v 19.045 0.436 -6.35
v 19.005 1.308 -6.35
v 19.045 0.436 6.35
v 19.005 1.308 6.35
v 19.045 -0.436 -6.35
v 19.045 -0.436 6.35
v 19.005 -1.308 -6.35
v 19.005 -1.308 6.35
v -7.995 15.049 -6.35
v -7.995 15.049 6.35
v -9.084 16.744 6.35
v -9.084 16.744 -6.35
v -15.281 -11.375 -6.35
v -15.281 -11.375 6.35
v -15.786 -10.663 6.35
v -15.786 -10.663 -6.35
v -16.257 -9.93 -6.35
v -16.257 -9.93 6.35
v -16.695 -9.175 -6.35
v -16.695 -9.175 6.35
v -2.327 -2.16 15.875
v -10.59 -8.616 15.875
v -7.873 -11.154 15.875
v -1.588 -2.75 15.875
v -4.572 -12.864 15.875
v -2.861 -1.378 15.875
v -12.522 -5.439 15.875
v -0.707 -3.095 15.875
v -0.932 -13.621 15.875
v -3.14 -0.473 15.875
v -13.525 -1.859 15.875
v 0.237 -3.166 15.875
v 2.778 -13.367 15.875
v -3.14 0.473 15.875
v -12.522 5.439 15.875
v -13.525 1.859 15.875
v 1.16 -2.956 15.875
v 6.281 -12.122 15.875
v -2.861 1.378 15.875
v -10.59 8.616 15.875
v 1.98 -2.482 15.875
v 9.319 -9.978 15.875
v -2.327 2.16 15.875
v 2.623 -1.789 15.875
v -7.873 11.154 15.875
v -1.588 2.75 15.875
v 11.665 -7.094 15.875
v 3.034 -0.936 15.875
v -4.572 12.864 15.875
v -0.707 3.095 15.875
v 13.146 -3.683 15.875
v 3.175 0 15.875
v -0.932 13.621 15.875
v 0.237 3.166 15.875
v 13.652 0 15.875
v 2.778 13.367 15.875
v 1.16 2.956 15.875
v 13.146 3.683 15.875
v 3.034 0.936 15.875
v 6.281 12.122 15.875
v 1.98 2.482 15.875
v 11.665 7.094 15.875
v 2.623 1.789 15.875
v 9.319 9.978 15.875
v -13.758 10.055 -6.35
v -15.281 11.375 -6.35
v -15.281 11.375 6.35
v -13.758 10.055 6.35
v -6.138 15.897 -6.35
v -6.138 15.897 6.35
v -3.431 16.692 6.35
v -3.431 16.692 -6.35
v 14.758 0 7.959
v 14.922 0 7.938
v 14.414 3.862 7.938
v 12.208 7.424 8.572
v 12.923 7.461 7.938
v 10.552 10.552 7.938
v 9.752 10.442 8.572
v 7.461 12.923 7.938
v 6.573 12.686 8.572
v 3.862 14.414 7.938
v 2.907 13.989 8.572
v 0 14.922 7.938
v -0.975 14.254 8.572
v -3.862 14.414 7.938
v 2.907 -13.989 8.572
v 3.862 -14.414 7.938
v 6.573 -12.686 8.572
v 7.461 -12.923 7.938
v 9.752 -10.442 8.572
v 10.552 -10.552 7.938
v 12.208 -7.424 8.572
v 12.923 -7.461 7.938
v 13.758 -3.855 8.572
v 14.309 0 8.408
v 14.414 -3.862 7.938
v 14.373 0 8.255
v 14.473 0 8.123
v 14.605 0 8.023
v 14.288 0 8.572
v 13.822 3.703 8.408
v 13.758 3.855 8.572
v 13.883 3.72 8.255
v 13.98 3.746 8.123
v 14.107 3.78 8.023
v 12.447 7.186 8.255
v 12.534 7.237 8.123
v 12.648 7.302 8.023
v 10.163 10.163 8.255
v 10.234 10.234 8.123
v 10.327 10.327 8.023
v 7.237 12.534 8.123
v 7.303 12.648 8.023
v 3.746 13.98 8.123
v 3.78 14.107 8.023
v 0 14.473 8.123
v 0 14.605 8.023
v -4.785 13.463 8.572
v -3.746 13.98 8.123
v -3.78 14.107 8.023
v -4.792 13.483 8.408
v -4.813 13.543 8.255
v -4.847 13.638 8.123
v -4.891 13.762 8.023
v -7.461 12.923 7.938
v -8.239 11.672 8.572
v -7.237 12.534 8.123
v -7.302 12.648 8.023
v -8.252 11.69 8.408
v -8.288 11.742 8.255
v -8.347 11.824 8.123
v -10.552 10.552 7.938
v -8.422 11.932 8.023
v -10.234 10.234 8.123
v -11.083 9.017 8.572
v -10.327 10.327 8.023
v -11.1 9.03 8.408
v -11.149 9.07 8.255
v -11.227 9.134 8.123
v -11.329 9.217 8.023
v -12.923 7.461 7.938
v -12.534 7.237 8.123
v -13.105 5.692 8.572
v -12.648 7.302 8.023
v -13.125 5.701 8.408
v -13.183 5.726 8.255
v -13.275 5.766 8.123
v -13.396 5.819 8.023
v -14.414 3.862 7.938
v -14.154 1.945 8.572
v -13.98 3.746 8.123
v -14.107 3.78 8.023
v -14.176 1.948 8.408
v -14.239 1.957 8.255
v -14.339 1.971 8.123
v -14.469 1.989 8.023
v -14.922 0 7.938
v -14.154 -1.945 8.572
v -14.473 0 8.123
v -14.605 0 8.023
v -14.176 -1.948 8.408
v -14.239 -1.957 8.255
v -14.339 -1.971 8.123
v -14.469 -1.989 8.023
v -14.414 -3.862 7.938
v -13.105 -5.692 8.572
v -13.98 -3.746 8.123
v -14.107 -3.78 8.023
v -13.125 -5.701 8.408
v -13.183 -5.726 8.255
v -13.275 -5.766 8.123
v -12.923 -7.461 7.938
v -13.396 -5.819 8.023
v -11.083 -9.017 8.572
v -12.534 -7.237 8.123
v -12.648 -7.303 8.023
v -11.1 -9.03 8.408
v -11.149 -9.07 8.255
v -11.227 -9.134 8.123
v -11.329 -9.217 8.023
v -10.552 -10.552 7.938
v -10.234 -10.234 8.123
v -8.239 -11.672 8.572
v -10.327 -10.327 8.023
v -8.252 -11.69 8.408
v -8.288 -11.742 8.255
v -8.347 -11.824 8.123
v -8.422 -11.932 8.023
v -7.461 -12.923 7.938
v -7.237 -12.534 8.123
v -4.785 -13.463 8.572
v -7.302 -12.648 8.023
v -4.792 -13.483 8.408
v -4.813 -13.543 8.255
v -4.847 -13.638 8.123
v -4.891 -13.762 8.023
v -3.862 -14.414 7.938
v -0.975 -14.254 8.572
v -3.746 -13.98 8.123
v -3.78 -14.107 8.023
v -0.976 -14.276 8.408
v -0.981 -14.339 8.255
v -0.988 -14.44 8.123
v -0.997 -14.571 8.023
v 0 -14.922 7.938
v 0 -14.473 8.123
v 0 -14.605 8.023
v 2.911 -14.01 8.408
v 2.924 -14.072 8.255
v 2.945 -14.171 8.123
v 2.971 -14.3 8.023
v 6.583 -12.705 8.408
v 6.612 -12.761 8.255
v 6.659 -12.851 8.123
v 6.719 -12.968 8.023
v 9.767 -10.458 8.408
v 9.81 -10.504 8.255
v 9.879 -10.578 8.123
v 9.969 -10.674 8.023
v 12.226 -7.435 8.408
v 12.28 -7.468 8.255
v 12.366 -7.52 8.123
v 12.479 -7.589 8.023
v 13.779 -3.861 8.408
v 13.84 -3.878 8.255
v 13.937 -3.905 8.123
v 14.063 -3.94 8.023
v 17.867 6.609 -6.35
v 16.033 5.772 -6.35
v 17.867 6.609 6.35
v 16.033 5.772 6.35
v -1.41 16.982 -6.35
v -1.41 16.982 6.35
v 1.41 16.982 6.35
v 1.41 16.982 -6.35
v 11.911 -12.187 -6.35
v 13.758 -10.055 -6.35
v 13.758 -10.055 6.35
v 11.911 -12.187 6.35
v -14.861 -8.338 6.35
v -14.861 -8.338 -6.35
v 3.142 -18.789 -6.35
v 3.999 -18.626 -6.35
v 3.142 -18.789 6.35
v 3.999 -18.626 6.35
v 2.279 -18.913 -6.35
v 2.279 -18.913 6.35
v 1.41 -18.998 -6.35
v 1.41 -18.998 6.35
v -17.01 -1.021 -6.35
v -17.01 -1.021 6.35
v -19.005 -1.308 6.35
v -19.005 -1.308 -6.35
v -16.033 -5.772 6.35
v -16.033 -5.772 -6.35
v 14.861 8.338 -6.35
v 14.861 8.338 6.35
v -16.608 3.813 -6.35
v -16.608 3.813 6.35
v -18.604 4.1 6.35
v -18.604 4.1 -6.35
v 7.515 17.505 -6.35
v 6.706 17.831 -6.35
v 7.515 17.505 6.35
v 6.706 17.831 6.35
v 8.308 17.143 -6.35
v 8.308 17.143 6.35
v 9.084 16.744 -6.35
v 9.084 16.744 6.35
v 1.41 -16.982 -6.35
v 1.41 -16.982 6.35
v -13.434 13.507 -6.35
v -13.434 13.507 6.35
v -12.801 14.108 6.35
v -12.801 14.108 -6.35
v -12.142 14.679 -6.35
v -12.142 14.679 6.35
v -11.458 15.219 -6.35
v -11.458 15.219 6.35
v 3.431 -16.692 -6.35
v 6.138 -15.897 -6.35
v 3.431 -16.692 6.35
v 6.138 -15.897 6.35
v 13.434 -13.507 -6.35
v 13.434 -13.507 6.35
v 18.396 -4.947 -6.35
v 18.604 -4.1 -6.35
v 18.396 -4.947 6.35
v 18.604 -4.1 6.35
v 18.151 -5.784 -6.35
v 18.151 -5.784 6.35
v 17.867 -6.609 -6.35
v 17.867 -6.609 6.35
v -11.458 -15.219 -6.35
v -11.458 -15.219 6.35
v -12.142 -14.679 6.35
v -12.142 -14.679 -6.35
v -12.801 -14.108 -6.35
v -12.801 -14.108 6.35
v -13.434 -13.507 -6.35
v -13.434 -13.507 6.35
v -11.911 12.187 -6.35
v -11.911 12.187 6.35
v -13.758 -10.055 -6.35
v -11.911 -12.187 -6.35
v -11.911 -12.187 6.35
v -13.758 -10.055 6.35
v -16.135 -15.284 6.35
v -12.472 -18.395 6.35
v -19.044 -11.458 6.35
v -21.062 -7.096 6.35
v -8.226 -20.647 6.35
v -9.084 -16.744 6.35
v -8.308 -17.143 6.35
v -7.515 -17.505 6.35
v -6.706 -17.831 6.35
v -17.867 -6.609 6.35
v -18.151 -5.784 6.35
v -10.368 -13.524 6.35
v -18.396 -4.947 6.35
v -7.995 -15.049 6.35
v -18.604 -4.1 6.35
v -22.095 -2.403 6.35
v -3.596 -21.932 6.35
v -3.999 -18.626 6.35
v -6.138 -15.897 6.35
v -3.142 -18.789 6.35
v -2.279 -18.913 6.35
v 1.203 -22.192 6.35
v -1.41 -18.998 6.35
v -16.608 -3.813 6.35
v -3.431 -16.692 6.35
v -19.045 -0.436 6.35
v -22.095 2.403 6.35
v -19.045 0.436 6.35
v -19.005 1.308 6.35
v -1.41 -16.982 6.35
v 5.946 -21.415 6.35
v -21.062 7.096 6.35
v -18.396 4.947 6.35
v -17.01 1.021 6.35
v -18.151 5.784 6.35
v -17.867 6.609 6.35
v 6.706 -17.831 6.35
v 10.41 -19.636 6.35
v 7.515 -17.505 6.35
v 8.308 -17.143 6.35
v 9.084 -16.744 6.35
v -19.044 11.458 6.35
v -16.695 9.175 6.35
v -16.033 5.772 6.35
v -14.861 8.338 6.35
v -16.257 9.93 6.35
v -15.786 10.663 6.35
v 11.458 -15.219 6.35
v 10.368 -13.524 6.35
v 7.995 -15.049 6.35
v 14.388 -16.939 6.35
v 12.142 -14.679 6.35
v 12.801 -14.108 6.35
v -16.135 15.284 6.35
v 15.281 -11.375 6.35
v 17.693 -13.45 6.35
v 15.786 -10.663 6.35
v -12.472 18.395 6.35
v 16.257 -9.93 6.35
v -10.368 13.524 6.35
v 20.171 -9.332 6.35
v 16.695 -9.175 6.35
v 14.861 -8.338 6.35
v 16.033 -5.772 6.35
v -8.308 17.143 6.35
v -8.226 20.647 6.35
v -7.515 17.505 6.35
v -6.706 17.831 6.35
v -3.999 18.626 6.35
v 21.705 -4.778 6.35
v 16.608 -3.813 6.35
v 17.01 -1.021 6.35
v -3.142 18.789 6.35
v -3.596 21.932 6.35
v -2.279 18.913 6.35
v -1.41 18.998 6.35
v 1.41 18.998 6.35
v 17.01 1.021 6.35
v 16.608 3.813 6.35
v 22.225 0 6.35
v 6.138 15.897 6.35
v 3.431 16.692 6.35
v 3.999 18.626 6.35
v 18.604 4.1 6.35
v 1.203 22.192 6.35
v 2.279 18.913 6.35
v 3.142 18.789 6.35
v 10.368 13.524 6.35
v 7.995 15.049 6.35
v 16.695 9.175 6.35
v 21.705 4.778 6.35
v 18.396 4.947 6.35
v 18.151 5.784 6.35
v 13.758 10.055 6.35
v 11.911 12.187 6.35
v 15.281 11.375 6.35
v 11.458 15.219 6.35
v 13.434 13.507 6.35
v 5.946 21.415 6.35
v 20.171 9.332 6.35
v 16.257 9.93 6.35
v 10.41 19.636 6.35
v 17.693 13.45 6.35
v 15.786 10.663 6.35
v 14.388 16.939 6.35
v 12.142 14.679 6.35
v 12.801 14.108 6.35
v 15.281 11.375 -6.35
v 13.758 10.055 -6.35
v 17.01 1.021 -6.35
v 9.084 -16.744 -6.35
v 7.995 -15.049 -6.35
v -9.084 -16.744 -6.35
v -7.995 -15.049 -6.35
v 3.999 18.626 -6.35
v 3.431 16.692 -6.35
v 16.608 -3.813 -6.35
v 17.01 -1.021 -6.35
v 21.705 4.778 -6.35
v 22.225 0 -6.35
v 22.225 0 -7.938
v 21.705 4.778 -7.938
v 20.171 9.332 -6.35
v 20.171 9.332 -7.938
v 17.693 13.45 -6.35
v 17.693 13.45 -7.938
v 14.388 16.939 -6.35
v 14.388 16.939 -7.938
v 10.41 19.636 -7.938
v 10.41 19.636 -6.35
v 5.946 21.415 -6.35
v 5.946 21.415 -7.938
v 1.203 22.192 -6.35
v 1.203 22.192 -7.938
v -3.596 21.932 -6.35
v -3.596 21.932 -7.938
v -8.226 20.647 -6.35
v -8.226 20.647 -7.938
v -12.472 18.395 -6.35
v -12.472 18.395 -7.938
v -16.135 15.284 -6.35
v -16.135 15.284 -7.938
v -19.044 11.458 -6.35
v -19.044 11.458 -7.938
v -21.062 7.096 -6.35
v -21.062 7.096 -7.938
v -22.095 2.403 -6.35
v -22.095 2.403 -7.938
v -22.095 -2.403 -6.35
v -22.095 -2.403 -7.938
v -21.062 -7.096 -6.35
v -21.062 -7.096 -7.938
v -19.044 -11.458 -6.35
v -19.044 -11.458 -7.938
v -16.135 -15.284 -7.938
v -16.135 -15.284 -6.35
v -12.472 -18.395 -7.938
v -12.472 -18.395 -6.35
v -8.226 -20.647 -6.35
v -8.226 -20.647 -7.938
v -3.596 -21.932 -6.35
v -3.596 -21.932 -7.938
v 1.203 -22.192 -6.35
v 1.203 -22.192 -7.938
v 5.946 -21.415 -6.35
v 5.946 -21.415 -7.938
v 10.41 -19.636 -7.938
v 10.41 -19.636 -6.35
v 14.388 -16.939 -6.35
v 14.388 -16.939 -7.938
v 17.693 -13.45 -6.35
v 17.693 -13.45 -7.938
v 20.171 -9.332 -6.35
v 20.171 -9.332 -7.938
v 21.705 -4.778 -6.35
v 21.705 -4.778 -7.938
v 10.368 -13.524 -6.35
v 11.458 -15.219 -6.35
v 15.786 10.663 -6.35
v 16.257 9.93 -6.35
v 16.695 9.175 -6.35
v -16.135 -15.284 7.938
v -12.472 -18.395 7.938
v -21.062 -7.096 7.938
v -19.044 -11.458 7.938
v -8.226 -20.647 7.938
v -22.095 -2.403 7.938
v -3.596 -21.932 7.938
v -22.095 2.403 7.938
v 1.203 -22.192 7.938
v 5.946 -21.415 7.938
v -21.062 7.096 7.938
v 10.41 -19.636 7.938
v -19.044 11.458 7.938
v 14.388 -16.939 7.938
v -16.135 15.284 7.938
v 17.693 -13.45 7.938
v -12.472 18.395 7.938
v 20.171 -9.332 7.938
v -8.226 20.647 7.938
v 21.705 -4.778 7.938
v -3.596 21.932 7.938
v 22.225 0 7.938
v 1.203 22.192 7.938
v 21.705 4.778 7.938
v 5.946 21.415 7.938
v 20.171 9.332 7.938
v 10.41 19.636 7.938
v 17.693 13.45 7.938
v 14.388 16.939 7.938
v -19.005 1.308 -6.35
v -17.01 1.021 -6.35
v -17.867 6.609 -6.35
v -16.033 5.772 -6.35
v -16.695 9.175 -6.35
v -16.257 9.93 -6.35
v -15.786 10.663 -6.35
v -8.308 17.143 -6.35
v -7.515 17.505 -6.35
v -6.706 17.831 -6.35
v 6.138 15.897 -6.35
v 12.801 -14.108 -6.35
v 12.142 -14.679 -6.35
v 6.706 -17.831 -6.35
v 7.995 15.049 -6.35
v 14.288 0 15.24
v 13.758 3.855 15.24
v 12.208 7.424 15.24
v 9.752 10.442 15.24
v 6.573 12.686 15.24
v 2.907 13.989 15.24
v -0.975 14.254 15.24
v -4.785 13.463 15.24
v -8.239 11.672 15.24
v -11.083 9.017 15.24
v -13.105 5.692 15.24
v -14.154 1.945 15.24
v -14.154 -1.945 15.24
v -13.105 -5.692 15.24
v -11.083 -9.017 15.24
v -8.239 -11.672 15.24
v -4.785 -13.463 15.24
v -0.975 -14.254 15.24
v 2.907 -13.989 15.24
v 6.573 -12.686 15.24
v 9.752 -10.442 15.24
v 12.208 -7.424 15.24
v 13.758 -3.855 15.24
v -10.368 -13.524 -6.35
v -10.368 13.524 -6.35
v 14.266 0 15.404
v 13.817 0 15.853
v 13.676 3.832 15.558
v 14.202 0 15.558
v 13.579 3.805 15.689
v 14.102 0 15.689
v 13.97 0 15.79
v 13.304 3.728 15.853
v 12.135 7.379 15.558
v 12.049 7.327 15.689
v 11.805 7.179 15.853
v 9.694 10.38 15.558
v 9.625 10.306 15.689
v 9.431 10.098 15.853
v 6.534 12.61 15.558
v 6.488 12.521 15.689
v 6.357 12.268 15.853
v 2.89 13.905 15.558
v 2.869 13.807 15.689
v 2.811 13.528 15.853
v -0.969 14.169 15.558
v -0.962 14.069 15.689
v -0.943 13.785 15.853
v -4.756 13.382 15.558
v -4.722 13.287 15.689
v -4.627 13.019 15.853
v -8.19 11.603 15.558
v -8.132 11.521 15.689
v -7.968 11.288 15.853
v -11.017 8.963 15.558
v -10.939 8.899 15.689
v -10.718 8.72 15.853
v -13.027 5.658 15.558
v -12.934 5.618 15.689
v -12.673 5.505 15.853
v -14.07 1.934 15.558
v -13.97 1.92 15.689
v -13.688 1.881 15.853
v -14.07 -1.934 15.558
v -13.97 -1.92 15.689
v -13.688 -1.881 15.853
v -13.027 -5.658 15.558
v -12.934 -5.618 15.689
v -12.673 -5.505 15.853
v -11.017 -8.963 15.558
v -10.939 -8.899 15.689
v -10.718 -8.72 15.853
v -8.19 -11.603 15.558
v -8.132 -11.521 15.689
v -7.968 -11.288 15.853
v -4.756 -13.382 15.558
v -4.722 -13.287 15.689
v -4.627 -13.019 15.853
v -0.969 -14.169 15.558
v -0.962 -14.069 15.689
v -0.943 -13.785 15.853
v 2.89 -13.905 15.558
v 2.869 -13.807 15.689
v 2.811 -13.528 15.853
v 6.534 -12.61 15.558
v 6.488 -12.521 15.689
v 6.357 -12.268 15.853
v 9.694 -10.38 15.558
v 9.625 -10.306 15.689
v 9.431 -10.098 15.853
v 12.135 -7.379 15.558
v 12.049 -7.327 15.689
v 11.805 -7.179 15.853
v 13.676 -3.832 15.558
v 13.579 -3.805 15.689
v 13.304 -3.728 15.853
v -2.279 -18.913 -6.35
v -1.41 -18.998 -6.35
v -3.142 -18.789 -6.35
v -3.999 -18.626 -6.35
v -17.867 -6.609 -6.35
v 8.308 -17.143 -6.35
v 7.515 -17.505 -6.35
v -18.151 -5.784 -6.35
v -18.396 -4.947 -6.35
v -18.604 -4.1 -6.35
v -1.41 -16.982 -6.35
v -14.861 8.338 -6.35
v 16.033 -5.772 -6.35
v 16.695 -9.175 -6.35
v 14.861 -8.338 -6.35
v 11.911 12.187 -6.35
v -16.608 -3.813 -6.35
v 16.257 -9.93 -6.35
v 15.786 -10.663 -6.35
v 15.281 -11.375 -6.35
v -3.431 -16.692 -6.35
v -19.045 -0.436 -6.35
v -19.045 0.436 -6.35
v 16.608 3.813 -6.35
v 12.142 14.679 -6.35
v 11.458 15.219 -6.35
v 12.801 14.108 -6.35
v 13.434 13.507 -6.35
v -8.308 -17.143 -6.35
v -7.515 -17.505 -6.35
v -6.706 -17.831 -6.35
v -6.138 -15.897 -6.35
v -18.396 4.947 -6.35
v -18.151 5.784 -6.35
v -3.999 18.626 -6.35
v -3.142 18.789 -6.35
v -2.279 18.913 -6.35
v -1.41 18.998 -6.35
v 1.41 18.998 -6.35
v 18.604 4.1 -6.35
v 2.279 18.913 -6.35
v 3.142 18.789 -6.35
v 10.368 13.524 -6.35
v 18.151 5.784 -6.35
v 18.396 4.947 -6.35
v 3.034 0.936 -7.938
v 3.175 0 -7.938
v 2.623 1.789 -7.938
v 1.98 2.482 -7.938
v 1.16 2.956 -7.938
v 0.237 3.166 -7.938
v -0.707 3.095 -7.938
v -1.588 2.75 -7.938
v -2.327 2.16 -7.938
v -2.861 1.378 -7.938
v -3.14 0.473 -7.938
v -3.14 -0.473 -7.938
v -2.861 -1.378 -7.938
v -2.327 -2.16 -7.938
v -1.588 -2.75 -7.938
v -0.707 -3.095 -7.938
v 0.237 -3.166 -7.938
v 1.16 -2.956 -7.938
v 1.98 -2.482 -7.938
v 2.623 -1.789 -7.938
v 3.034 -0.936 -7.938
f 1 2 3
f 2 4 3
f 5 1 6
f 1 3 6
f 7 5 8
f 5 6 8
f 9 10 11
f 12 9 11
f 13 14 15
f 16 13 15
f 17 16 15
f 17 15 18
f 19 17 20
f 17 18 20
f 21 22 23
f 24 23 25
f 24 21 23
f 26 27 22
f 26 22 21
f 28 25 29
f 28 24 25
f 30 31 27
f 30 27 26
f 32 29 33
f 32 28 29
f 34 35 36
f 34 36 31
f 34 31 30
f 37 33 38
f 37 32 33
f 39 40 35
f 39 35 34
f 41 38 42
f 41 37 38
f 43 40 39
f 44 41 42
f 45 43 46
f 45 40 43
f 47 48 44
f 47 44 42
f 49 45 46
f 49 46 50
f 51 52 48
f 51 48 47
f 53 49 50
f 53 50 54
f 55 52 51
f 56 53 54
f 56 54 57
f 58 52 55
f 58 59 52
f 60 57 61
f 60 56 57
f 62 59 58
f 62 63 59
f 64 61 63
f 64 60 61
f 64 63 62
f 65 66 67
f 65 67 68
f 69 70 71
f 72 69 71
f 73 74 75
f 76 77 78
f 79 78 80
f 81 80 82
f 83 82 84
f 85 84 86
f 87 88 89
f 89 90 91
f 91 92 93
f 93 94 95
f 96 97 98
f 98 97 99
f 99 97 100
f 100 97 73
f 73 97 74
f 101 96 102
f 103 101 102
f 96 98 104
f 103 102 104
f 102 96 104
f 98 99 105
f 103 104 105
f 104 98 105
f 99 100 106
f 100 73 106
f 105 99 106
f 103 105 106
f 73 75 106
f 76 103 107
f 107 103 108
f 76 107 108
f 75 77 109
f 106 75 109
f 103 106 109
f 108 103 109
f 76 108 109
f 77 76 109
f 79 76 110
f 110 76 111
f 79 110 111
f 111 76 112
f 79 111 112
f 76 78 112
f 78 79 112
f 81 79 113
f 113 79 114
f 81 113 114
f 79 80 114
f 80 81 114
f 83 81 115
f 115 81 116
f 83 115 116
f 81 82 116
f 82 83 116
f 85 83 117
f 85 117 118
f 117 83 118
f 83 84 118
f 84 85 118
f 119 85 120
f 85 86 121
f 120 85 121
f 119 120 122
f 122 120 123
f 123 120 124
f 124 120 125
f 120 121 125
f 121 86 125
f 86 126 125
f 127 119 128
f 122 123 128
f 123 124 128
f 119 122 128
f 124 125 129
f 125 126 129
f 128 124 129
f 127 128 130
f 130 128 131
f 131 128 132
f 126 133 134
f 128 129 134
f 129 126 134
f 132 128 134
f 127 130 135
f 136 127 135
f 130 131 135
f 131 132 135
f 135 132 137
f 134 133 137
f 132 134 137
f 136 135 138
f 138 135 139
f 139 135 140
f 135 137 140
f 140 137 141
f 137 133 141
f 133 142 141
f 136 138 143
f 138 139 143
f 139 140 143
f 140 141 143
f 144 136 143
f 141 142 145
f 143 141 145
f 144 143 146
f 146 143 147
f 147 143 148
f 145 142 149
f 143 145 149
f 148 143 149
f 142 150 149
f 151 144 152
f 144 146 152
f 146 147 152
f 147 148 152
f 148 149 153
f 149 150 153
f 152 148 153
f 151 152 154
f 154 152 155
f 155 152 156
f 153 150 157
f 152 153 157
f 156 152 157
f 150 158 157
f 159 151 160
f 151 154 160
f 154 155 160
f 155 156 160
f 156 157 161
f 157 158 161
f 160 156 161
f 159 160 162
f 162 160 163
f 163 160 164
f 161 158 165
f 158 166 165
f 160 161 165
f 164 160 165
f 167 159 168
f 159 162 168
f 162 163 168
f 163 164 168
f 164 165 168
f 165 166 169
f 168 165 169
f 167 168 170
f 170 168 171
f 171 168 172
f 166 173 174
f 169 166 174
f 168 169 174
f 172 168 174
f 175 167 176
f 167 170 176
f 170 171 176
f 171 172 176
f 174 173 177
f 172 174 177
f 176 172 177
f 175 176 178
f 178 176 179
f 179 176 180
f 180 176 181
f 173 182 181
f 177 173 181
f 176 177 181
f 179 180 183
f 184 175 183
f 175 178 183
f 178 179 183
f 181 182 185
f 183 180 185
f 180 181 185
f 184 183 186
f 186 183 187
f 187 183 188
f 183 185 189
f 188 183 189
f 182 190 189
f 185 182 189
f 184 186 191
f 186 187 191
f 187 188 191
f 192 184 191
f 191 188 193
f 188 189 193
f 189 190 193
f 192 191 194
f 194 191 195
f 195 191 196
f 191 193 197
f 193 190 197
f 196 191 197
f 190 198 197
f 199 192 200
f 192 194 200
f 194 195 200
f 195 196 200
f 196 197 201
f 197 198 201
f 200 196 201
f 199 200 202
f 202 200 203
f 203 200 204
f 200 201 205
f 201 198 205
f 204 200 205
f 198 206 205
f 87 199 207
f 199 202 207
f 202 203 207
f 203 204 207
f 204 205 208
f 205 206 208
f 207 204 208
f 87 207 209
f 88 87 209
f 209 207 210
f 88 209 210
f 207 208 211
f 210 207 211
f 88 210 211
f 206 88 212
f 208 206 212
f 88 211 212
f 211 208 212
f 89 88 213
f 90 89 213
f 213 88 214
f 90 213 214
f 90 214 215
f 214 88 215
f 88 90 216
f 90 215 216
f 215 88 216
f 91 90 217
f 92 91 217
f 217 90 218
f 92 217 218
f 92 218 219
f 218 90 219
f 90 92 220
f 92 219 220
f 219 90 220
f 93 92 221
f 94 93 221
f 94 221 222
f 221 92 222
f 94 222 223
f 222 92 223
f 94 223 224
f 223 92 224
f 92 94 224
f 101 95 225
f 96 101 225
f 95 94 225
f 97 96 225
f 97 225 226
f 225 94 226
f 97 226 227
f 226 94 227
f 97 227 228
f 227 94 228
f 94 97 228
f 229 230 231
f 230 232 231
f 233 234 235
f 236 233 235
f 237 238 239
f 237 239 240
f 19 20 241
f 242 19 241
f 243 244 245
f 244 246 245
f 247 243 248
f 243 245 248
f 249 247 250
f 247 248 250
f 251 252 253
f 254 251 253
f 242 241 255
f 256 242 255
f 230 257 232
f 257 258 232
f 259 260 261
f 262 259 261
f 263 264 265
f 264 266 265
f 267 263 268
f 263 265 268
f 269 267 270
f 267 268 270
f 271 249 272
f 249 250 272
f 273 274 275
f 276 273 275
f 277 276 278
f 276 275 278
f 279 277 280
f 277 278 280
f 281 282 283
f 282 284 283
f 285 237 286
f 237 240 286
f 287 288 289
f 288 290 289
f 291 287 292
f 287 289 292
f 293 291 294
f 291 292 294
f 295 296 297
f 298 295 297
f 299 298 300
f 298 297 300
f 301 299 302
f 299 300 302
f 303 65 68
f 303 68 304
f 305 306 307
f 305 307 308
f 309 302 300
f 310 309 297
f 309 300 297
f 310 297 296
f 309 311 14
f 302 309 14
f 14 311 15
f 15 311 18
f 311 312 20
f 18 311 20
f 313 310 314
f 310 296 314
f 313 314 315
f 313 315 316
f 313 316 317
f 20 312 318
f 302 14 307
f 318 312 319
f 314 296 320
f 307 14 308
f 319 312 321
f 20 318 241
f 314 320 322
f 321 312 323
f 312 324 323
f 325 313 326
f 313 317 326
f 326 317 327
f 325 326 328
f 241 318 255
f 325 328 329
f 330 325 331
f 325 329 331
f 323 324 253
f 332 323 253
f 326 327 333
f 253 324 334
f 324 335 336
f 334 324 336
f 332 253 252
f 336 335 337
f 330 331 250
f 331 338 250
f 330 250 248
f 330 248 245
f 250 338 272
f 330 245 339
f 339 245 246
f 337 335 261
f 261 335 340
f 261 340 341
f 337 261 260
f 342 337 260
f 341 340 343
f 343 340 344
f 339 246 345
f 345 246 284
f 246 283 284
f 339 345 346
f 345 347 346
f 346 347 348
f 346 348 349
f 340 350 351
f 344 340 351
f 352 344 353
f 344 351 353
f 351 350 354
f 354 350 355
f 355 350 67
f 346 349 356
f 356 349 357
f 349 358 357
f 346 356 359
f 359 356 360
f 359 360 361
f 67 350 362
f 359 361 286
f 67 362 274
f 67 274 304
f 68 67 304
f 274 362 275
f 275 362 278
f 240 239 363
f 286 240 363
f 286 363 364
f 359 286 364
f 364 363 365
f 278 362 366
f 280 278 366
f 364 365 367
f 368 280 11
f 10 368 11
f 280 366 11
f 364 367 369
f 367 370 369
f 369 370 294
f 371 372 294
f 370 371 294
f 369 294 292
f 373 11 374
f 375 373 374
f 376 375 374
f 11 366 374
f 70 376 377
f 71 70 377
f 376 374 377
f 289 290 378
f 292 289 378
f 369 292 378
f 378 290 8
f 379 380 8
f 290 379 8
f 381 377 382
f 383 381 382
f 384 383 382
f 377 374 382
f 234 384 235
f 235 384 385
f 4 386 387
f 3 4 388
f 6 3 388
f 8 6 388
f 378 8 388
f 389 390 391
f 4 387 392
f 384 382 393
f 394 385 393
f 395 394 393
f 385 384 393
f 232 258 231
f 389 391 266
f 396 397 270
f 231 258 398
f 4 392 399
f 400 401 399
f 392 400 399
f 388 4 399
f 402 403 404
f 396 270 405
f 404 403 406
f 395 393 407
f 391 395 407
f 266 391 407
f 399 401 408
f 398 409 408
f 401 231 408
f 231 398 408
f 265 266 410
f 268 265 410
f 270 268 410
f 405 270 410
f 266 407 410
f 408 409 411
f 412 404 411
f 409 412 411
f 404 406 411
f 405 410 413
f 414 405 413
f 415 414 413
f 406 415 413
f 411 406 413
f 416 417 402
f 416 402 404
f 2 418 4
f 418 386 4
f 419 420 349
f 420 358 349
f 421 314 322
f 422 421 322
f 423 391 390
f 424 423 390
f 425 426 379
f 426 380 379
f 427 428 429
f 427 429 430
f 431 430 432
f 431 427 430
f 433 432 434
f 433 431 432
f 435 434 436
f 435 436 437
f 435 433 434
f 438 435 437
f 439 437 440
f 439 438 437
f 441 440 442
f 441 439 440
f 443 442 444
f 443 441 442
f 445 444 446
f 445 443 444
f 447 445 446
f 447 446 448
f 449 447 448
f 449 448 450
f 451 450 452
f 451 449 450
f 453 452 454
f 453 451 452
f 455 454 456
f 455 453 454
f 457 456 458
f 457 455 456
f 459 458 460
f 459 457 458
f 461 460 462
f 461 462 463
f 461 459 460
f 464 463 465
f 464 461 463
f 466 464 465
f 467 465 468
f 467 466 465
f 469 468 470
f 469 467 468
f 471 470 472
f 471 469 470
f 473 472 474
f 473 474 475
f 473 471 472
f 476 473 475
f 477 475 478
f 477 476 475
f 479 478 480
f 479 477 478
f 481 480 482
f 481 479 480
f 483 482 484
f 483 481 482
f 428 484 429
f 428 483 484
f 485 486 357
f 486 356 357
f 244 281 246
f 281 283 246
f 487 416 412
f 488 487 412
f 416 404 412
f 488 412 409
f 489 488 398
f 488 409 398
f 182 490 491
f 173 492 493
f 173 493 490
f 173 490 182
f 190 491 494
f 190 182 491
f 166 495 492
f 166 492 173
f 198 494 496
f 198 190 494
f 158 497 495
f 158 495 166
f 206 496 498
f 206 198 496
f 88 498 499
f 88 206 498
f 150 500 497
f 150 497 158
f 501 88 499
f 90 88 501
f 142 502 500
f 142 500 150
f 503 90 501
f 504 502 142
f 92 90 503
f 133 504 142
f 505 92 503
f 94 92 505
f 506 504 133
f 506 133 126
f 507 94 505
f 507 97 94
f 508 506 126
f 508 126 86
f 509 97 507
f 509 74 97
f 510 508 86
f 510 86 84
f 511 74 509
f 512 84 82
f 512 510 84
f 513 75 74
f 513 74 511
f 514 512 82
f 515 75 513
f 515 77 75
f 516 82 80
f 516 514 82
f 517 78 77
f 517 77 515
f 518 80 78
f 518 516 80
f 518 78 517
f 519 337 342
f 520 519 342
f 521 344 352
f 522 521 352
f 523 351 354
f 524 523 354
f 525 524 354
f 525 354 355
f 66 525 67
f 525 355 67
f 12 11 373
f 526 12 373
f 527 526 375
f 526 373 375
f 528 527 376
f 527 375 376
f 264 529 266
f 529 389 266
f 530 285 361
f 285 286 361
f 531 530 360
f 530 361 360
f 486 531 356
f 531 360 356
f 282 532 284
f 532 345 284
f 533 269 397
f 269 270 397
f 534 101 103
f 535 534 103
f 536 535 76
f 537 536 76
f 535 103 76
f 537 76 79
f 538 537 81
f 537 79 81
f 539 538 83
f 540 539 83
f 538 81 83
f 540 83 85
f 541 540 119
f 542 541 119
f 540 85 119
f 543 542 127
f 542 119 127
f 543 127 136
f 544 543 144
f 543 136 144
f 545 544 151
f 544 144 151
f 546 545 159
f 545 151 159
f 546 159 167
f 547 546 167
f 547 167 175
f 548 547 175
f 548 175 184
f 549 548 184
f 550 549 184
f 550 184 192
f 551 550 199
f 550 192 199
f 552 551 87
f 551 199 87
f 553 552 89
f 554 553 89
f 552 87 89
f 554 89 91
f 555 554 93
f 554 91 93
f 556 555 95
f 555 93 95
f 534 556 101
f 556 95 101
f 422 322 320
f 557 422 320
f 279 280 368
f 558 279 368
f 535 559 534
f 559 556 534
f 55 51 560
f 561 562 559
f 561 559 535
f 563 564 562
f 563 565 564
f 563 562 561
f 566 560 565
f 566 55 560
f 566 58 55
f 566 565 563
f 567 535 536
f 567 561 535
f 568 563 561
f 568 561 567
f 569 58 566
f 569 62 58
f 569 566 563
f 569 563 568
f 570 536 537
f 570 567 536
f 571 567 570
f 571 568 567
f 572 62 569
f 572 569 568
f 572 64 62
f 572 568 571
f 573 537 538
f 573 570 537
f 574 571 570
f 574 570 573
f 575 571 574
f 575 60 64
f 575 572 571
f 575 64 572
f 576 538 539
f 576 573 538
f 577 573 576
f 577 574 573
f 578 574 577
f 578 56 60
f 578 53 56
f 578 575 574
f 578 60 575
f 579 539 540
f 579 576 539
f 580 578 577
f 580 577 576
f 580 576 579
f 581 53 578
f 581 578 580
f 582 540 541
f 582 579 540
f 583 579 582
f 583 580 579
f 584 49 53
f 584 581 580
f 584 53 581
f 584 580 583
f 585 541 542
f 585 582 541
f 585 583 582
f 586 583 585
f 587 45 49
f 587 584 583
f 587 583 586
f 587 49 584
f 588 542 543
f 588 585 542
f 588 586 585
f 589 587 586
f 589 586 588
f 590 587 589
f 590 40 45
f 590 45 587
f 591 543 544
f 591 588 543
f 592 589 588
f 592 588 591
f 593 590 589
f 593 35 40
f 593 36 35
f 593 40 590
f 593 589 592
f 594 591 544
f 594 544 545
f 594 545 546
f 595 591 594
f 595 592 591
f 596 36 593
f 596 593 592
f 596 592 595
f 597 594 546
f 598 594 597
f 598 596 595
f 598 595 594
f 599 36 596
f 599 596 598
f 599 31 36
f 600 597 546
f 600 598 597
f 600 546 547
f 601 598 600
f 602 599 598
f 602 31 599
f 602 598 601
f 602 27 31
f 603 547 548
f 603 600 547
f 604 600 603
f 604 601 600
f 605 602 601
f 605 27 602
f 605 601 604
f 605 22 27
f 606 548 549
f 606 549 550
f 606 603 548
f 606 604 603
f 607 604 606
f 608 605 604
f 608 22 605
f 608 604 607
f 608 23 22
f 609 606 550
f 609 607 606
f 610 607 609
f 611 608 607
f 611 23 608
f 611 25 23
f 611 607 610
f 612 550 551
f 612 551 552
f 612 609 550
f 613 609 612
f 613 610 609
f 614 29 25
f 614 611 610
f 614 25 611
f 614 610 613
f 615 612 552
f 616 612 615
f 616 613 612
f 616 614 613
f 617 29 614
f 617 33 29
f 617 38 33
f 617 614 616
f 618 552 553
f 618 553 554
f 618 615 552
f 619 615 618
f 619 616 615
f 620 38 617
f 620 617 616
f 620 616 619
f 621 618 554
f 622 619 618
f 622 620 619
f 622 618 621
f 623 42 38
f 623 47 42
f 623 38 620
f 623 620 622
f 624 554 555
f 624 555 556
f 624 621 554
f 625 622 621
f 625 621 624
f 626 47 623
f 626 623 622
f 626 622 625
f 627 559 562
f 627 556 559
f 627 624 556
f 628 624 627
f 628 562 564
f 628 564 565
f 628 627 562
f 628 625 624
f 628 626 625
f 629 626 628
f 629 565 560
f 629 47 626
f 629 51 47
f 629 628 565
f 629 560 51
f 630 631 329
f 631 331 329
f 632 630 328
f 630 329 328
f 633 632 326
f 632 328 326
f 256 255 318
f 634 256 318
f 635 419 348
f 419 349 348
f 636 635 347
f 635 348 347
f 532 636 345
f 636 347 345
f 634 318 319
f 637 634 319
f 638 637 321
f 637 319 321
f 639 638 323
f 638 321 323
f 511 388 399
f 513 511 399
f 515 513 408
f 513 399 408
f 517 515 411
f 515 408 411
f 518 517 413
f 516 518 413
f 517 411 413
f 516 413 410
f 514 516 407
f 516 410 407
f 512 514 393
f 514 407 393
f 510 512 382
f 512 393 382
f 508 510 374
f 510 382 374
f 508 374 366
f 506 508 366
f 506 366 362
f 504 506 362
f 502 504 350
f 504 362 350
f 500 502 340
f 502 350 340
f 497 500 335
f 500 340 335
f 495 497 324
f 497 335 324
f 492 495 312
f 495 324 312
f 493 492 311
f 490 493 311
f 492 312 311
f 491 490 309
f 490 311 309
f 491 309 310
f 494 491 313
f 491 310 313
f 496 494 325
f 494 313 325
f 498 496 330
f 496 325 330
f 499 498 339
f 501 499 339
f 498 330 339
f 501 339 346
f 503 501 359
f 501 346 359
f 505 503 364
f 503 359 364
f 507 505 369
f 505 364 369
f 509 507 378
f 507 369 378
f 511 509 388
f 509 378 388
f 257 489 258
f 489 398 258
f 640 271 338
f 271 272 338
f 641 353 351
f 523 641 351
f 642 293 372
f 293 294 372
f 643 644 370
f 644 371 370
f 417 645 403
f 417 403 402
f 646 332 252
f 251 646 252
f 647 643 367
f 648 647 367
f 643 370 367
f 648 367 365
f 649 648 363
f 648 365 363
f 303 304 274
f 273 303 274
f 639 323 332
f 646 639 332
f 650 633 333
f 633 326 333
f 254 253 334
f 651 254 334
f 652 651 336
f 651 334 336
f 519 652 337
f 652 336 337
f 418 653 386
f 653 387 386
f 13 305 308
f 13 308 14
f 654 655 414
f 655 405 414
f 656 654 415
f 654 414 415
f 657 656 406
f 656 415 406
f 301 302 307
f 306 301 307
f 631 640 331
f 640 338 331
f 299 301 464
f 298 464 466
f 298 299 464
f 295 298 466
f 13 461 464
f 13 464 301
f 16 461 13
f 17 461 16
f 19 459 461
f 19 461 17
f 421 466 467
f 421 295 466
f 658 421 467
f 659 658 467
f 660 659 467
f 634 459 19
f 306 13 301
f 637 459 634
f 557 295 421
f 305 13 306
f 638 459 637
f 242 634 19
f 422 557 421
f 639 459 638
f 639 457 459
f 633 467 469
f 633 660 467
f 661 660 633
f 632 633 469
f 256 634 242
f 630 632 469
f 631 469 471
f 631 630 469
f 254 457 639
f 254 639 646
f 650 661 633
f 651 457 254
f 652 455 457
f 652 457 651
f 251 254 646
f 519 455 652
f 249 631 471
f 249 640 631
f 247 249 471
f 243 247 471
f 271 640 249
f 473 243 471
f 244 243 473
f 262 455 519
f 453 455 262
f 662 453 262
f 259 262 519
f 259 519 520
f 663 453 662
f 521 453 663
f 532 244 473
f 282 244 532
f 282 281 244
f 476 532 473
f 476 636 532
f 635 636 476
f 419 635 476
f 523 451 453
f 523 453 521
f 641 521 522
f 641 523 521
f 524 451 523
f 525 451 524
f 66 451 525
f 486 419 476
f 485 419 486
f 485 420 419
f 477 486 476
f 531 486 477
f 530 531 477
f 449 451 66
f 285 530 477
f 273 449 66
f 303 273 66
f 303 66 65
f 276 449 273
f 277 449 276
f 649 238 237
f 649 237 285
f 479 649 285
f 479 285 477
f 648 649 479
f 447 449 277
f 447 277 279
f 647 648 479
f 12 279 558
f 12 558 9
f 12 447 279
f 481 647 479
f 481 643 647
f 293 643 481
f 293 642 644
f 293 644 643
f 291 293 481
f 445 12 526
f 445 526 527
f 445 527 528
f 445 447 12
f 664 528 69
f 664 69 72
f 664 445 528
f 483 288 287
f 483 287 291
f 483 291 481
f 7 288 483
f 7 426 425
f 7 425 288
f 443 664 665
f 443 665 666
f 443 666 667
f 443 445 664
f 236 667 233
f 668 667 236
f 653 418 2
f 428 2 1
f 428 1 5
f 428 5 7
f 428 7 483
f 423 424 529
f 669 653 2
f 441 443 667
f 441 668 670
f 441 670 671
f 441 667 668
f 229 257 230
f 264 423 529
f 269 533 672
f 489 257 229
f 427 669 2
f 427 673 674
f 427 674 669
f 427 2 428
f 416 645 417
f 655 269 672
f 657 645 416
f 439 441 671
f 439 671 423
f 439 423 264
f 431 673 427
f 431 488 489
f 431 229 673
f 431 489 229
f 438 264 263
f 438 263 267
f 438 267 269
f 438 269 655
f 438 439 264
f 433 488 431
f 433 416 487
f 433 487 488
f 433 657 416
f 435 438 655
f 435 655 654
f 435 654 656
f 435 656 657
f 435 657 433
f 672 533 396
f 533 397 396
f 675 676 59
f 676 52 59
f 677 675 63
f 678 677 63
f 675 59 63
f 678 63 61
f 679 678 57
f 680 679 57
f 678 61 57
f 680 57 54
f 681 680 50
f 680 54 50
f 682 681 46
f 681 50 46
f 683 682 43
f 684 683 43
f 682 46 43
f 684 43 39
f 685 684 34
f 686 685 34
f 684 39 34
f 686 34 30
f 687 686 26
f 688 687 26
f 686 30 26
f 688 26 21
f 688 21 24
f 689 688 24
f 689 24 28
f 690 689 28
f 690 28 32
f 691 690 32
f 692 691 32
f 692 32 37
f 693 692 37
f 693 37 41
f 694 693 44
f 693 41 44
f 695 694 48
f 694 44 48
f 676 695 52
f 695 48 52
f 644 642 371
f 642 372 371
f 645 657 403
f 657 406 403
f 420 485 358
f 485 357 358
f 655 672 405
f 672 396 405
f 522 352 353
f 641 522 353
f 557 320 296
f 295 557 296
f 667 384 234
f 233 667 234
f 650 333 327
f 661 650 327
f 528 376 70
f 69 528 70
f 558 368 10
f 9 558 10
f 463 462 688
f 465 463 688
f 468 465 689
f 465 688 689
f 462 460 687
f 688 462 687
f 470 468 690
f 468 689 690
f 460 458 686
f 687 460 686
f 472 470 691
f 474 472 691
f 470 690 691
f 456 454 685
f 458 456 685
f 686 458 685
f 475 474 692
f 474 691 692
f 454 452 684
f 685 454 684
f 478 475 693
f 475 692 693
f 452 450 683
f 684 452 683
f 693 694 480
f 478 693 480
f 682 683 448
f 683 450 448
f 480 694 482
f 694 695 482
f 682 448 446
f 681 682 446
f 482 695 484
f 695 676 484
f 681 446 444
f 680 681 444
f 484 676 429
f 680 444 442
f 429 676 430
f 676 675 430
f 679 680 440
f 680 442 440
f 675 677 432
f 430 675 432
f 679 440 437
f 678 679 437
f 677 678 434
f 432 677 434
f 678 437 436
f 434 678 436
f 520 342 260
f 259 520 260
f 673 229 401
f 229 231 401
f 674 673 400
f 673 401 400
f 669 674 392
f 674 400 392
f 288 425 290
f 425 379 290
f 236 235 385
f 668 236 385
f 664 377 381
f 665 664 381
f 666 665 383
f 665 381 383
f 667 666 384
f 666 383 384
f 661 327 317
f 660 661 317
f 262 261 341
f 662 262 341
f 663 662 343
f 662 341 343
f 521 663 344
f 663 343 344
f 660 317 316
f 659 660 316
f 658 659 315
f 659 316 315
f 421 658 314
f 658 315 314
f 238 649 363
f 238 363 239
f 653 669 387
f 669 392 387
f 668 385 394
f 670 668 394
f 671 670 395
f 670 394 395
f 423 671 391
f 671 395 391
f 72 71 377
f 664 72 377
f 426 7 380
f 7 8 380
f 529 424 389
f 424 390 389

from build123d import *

# Parameters (mm, degrees)
SKETCH1_R           = 3.175
BOSS_EXTRUDE3_DEPTH = 6.35
SKETCH2_R           = 22.225
SKETCH2_R_2         = 3.175
BOSS_EXTRUDE4_DEPTH = 1.5875
SKETCH3_R           = 14.2875
SKETCH3_R_2         = 3.175
BOSS_EXTRUDE5_DEPTH = 7.9375
FILLET1_R           = 0.635


with BuildPart() as part:
    # Sketch1 → Boss-Extrude3 (new body)
    with BuildSketch(Plane.XY):
        with BuildLine():
            Line((3.998939094, 18.625546599), (3.431060125, 16.691528444))
            Line((3.431060125, 16.691528444), (6.137730131, 15.896778422))
            Line((6.137730131, 15.896778422), (6.705609099, 17.830796578))
            ThreePointArc((6.705609099, 17.830796578), (7.913655998, 17.328489512), (9.084376828, 16.744449756))
            Line((9.084376828, 16.744449756), (7.994625068, 15.048762919))
            Line((7.994625068, 15.048762919), (10.367748965, 13.523648797))
            Line((10.367748965, 13.523648797), (11.457500725, 15.219335634))
            ThreePointArc((11.457500725, 15.219335634), (12.475096982, 14.397029391), (13.433852379, 13.506817177))
            Line((13.433852379, 13.506817177), (11.910513034, 12.186836121))
            Line((11.910513034, 12.186836121), (13.757834437, 10.054913573))
            Line((13.757834437, 10.054913573), (15.281173782, 11.37489463))
            ThreePointArc((15.281173782, 11.37489463), (16.0258798, 10.299207573), (16.694997104, 9.174942598))
            Line((16.694997104, 9.174942598), (14.861482068, 8.337604338))
            Line((14.861482068, 8.337604338), (16.033341984, 5.771589051))
            Line((16.033341984, 5.771589051), (17.86685702, 6.608927312))
            ThreePointArc((17.86685702, 6.608927312), (18.278341147, 5.367005208), (18.603612453, 4.099768736))
            Line((18.603612453, 4.099768736), (16.60846221, 3.812909438))
            Line((16.60846221, 3.812909438), (17.009923518, 1.020684709))
            Line((17.009923518, 1.020684709), (19.005073761, 1.307544008))
            ThreePointArc((19.005073761, 1.307544008), (19.05, 0), (19.005073761, -1.307544008))
            Line((19.005073761, -1.307544008), (17.009923518, -1.020684709))
            Line((17.009923518, -1.020684709), (16.60846221, -3.812909438))
            Line((16.60846221, -3.812909438), (18.603612453, -4.099768736))
            ThreePointArc((18.603612453, -4.099768736), (18.278341147, -5.367005208), (17.86685702, -6.608927312))
            Line((17.86685702, -6.608927312), (16.033341984, -5.771589051))
            Line((16.033341984, -5.771589051), (14.861482068, -8.337604338))
            Line((14.861482068, -8.337604338), (16.694997104, -9.174942598))
            ThreePointArc((16.694997104, -9.174942598), (16.0258798, -10.299207573), (15.281173782, -11.37489463))
            Line((15.281173782, -11.37489463), (13.757834437, -10.054913573))
            Line((13.757834437, -10.054913573), (11.910513034, -12.186836121))
            Line((11.910513034, -12.186836121), (13.433852379, -13.506817177))
            ThreePointArc((13.433852379, -13.506817177), (12.475096982, -14.397029391), (11.457500725, -15.219335634))
            Line((11.457500725, -15.219335634), (10.367748965, -13.523648797))
            Line((10.367748965, -13.523648797), (7.994625068, -15.048762919))
            Line((7.994625068, -15.048762919), (9.084376828, -16.744449756))
            ThreePointArc((9.084376828, -16.744449756), (7.913655998, -17.328489512), (6.705609099, -17.830796578))
            Line((6.705609099, -17.830796578), (6.137730131, -15.896778422))
            Line((6.137730131, -15.896778422), (3.431060125, -16.691528444))
            Line((3.431060125, -16.691528444), (3.998939094, -18.625546599))
            ThreePointArc((3.998939094, -18.625546599), (2.711097669, -18.856098468), (1.410468904, -18.997712427))
            Line((1.410468904, -18.997712427), (1.410468904, -16.982045602))
            Line((1.410468904, -16.982045602), (-1.410468904, -16.982045602))
            Line((-1.410468904, -16.982045602), (-1.410468904, -18.997712427))
            ThreePointArc((-1.410468904, -18.997712427), (-2.711097669, -18.856098468), (-3.998939094, -18.625546599))
            Line((-3.998939094, -18.625546599), (-3.431060125, -16.691528444))
            Line((-3.431060125, -16.691528444), (-6.137730131, -15.896778422))
            Line((-6.137730131, -15.896778422), (-6.705609099, -17.830796578))
            ThreePointArc((-6.705609099, -17.830796578), (-7.913655998, -17.328489512), (-9.084376828, -16.744449756))
            Line((-9.084376828, -16.744449756), (-7.994625068, -15.048762919))
            Line((-7.994625068, -15.048762919), (-10.367748965, -13.523648797))
            Line((-10.367748965, -13.523648797), (-11.457500725, -15.219335634))
            ThreePointArc((-11.457500725, -15.219335634), (-12.475096982, -14.397029391), (-13.433852379, -13.506817177))
            Line((-13.433852379, -13.506817177), (-11.910513034, -12.186836121))
            Line((-11.910513034, -12.186836121), (-13.757834437, -10.054913573))
            Line((-13.757834437, -10.054913573), (-15.281173782, -11.37489463))
            ThreePointArc((-15.281173782, -11.37489463), (-16.0258798, -10.299207573), (-16.694997104, -9.174942598))
            Line((-16.694997104, -9.174942598), (-14.861482068, -8.337604338))
            Line((-14.861482068, -8.337604338), (-16.033341984, -5.771589051))
            Line((-16.033341984, -5.771589051), (-17.86685702, -6.608927312))
            ThreePointArc((-17.86685702, -6.608927312), (-18.278341147, -5.367005208), (-18.603612453, -4.099768736))
            Line((-18.603612453, -4.099768736), (-16.60846221, -3.812909438))
            Line((-16.60846221, -3.812909438), (-17.009923518, -1.020684709))
            Line((-17.009923518, -1.020684709), (-19.005073761, -1.307544008))
            ThreePointArc((-19.005073761, -1.307544008), (-19.05, 0), (-19.005073761, 1.307544008))
            Line((-19.005073761, 1.307544008), (-17.009923518, 1.020684709))
            Line((-17.009923518, 1.020684709), (-16.60846221, 3.812909438))
            Line((-16.60846221, 3.812909438), (-18.603612453, 4.099768736))
            ThreePointArc((-18.603612453, 4.099768736), (-18.278341147, 5.367005208), (-17.86685702, 6.608927312))
            Line((-17.86685702, 6.608927312), (-16.033341984, 5.771589051))
            Line((-16.033341984, 5.771589051), (-14.861482068, 8.337604338))
            Line((-14.861482068, 8.337604338), (-16.694997104, 9.174942598))
            ThreePointArc((-16.694997104, 9.174942598), (-16.0258798, 10.299207573), (-15.281173782, 11.37489463))
            Line((-15.281173782, 11.37489463), (-13.757834437, 10.054913573))
            Line((-13.757834437, 10.054913573), (-11.910513034, 12.186836121))
            Line((-11.910513034, 12.186836121), (-13.433852379, 13.506817177))
            ThreePointArc((-13.433852379, 13.506817177), (-12.475096982, 14.397029391), (-11.457500725, 15.219335634))
            Line((-11.457500725, 15.219335634), (-10.367748965, 13.523648797))
            Line((-10.367748965, 13.523648797), (-7.994625068, 15.048762919))
            Line((-7.994625068, 15.048762919), (-9.084376828, 16.744449756))
            ThreePointArc((-9.084376828, 16.744449756), (-7.913655998, 17.328489512), (-6.705609099, 17.830796578))
            Line((-6.705609099, 17.830796578), (-6.137730131, 15.896778422))
            Line((-6.137730131, 15.896778422), (-3.431060125, 16.691528444))
            Line((-3.431060125, 16.691528444), (-3.998939094, 18.625546599))
            ThreePointArc((-3.998939094, 18.625546599), (-2.711097669, 18.856098468), (-1.410468904, 18.997712427))
            Line((-1.410468904, 18.997712427), (-1.410468904, 16.982045602))
            Line((-1.410468904, 16.982045602), (1.410468904, 16.982045602))
            Line((1.410468904, 16.982045602), (1.410468904, 18.997712427))
            ThreePointArc((1.410468904, 18.997712427), (2.711097669, 18.856098468), (3.998939094, 18.625546599))
        make_face()
        Circle(SKETCH1_R, mode=Mode.SUBTRACT)
    boss_extrude3 = extrude(amount=BOSS_EXTRUDE3_DEPTH)

    # Sketch2 → Boss-Extrude4 (add)
    with BuildSketch(Plane.XY.offset(6.35)):
        Circle(SKETCH2_R)
        Circle(SKETCH2_R_2, mode=Mode.SUBTRACT)
    boss_extrude4 = extrude(amount=BOSS_EXTRUDE4_DEPTH)

    # Sketch3 → Boss-Extrude5 (add)
    with BuildSketch(Plane.XY.offset(7.9375)):
        Circle(SKETCH3_R)
        Circle(SKETCH3_R_2, mode=Mode.SUBTRACT)
    extrude(amount=BOSS_EXTRUDE5_DEPTH)

    # Fillet1
    fillet1_edges = [part.edges().sort_by_distance(p)[0] for p in [
        (-14.2875, 0, 7.9375),
        (-14.2875, 0, 15.875),
    ]]
    fillet(fillet1_edges, radius=FILLET1_R)

    # Mirror1: Boss-Extrude3, Boss-Extrude4 across plane
    add(boss_extrude3.mirror(Plane.XY))
    add(boss_extrude4.mirror(Plane.XY))


solid = part.part
